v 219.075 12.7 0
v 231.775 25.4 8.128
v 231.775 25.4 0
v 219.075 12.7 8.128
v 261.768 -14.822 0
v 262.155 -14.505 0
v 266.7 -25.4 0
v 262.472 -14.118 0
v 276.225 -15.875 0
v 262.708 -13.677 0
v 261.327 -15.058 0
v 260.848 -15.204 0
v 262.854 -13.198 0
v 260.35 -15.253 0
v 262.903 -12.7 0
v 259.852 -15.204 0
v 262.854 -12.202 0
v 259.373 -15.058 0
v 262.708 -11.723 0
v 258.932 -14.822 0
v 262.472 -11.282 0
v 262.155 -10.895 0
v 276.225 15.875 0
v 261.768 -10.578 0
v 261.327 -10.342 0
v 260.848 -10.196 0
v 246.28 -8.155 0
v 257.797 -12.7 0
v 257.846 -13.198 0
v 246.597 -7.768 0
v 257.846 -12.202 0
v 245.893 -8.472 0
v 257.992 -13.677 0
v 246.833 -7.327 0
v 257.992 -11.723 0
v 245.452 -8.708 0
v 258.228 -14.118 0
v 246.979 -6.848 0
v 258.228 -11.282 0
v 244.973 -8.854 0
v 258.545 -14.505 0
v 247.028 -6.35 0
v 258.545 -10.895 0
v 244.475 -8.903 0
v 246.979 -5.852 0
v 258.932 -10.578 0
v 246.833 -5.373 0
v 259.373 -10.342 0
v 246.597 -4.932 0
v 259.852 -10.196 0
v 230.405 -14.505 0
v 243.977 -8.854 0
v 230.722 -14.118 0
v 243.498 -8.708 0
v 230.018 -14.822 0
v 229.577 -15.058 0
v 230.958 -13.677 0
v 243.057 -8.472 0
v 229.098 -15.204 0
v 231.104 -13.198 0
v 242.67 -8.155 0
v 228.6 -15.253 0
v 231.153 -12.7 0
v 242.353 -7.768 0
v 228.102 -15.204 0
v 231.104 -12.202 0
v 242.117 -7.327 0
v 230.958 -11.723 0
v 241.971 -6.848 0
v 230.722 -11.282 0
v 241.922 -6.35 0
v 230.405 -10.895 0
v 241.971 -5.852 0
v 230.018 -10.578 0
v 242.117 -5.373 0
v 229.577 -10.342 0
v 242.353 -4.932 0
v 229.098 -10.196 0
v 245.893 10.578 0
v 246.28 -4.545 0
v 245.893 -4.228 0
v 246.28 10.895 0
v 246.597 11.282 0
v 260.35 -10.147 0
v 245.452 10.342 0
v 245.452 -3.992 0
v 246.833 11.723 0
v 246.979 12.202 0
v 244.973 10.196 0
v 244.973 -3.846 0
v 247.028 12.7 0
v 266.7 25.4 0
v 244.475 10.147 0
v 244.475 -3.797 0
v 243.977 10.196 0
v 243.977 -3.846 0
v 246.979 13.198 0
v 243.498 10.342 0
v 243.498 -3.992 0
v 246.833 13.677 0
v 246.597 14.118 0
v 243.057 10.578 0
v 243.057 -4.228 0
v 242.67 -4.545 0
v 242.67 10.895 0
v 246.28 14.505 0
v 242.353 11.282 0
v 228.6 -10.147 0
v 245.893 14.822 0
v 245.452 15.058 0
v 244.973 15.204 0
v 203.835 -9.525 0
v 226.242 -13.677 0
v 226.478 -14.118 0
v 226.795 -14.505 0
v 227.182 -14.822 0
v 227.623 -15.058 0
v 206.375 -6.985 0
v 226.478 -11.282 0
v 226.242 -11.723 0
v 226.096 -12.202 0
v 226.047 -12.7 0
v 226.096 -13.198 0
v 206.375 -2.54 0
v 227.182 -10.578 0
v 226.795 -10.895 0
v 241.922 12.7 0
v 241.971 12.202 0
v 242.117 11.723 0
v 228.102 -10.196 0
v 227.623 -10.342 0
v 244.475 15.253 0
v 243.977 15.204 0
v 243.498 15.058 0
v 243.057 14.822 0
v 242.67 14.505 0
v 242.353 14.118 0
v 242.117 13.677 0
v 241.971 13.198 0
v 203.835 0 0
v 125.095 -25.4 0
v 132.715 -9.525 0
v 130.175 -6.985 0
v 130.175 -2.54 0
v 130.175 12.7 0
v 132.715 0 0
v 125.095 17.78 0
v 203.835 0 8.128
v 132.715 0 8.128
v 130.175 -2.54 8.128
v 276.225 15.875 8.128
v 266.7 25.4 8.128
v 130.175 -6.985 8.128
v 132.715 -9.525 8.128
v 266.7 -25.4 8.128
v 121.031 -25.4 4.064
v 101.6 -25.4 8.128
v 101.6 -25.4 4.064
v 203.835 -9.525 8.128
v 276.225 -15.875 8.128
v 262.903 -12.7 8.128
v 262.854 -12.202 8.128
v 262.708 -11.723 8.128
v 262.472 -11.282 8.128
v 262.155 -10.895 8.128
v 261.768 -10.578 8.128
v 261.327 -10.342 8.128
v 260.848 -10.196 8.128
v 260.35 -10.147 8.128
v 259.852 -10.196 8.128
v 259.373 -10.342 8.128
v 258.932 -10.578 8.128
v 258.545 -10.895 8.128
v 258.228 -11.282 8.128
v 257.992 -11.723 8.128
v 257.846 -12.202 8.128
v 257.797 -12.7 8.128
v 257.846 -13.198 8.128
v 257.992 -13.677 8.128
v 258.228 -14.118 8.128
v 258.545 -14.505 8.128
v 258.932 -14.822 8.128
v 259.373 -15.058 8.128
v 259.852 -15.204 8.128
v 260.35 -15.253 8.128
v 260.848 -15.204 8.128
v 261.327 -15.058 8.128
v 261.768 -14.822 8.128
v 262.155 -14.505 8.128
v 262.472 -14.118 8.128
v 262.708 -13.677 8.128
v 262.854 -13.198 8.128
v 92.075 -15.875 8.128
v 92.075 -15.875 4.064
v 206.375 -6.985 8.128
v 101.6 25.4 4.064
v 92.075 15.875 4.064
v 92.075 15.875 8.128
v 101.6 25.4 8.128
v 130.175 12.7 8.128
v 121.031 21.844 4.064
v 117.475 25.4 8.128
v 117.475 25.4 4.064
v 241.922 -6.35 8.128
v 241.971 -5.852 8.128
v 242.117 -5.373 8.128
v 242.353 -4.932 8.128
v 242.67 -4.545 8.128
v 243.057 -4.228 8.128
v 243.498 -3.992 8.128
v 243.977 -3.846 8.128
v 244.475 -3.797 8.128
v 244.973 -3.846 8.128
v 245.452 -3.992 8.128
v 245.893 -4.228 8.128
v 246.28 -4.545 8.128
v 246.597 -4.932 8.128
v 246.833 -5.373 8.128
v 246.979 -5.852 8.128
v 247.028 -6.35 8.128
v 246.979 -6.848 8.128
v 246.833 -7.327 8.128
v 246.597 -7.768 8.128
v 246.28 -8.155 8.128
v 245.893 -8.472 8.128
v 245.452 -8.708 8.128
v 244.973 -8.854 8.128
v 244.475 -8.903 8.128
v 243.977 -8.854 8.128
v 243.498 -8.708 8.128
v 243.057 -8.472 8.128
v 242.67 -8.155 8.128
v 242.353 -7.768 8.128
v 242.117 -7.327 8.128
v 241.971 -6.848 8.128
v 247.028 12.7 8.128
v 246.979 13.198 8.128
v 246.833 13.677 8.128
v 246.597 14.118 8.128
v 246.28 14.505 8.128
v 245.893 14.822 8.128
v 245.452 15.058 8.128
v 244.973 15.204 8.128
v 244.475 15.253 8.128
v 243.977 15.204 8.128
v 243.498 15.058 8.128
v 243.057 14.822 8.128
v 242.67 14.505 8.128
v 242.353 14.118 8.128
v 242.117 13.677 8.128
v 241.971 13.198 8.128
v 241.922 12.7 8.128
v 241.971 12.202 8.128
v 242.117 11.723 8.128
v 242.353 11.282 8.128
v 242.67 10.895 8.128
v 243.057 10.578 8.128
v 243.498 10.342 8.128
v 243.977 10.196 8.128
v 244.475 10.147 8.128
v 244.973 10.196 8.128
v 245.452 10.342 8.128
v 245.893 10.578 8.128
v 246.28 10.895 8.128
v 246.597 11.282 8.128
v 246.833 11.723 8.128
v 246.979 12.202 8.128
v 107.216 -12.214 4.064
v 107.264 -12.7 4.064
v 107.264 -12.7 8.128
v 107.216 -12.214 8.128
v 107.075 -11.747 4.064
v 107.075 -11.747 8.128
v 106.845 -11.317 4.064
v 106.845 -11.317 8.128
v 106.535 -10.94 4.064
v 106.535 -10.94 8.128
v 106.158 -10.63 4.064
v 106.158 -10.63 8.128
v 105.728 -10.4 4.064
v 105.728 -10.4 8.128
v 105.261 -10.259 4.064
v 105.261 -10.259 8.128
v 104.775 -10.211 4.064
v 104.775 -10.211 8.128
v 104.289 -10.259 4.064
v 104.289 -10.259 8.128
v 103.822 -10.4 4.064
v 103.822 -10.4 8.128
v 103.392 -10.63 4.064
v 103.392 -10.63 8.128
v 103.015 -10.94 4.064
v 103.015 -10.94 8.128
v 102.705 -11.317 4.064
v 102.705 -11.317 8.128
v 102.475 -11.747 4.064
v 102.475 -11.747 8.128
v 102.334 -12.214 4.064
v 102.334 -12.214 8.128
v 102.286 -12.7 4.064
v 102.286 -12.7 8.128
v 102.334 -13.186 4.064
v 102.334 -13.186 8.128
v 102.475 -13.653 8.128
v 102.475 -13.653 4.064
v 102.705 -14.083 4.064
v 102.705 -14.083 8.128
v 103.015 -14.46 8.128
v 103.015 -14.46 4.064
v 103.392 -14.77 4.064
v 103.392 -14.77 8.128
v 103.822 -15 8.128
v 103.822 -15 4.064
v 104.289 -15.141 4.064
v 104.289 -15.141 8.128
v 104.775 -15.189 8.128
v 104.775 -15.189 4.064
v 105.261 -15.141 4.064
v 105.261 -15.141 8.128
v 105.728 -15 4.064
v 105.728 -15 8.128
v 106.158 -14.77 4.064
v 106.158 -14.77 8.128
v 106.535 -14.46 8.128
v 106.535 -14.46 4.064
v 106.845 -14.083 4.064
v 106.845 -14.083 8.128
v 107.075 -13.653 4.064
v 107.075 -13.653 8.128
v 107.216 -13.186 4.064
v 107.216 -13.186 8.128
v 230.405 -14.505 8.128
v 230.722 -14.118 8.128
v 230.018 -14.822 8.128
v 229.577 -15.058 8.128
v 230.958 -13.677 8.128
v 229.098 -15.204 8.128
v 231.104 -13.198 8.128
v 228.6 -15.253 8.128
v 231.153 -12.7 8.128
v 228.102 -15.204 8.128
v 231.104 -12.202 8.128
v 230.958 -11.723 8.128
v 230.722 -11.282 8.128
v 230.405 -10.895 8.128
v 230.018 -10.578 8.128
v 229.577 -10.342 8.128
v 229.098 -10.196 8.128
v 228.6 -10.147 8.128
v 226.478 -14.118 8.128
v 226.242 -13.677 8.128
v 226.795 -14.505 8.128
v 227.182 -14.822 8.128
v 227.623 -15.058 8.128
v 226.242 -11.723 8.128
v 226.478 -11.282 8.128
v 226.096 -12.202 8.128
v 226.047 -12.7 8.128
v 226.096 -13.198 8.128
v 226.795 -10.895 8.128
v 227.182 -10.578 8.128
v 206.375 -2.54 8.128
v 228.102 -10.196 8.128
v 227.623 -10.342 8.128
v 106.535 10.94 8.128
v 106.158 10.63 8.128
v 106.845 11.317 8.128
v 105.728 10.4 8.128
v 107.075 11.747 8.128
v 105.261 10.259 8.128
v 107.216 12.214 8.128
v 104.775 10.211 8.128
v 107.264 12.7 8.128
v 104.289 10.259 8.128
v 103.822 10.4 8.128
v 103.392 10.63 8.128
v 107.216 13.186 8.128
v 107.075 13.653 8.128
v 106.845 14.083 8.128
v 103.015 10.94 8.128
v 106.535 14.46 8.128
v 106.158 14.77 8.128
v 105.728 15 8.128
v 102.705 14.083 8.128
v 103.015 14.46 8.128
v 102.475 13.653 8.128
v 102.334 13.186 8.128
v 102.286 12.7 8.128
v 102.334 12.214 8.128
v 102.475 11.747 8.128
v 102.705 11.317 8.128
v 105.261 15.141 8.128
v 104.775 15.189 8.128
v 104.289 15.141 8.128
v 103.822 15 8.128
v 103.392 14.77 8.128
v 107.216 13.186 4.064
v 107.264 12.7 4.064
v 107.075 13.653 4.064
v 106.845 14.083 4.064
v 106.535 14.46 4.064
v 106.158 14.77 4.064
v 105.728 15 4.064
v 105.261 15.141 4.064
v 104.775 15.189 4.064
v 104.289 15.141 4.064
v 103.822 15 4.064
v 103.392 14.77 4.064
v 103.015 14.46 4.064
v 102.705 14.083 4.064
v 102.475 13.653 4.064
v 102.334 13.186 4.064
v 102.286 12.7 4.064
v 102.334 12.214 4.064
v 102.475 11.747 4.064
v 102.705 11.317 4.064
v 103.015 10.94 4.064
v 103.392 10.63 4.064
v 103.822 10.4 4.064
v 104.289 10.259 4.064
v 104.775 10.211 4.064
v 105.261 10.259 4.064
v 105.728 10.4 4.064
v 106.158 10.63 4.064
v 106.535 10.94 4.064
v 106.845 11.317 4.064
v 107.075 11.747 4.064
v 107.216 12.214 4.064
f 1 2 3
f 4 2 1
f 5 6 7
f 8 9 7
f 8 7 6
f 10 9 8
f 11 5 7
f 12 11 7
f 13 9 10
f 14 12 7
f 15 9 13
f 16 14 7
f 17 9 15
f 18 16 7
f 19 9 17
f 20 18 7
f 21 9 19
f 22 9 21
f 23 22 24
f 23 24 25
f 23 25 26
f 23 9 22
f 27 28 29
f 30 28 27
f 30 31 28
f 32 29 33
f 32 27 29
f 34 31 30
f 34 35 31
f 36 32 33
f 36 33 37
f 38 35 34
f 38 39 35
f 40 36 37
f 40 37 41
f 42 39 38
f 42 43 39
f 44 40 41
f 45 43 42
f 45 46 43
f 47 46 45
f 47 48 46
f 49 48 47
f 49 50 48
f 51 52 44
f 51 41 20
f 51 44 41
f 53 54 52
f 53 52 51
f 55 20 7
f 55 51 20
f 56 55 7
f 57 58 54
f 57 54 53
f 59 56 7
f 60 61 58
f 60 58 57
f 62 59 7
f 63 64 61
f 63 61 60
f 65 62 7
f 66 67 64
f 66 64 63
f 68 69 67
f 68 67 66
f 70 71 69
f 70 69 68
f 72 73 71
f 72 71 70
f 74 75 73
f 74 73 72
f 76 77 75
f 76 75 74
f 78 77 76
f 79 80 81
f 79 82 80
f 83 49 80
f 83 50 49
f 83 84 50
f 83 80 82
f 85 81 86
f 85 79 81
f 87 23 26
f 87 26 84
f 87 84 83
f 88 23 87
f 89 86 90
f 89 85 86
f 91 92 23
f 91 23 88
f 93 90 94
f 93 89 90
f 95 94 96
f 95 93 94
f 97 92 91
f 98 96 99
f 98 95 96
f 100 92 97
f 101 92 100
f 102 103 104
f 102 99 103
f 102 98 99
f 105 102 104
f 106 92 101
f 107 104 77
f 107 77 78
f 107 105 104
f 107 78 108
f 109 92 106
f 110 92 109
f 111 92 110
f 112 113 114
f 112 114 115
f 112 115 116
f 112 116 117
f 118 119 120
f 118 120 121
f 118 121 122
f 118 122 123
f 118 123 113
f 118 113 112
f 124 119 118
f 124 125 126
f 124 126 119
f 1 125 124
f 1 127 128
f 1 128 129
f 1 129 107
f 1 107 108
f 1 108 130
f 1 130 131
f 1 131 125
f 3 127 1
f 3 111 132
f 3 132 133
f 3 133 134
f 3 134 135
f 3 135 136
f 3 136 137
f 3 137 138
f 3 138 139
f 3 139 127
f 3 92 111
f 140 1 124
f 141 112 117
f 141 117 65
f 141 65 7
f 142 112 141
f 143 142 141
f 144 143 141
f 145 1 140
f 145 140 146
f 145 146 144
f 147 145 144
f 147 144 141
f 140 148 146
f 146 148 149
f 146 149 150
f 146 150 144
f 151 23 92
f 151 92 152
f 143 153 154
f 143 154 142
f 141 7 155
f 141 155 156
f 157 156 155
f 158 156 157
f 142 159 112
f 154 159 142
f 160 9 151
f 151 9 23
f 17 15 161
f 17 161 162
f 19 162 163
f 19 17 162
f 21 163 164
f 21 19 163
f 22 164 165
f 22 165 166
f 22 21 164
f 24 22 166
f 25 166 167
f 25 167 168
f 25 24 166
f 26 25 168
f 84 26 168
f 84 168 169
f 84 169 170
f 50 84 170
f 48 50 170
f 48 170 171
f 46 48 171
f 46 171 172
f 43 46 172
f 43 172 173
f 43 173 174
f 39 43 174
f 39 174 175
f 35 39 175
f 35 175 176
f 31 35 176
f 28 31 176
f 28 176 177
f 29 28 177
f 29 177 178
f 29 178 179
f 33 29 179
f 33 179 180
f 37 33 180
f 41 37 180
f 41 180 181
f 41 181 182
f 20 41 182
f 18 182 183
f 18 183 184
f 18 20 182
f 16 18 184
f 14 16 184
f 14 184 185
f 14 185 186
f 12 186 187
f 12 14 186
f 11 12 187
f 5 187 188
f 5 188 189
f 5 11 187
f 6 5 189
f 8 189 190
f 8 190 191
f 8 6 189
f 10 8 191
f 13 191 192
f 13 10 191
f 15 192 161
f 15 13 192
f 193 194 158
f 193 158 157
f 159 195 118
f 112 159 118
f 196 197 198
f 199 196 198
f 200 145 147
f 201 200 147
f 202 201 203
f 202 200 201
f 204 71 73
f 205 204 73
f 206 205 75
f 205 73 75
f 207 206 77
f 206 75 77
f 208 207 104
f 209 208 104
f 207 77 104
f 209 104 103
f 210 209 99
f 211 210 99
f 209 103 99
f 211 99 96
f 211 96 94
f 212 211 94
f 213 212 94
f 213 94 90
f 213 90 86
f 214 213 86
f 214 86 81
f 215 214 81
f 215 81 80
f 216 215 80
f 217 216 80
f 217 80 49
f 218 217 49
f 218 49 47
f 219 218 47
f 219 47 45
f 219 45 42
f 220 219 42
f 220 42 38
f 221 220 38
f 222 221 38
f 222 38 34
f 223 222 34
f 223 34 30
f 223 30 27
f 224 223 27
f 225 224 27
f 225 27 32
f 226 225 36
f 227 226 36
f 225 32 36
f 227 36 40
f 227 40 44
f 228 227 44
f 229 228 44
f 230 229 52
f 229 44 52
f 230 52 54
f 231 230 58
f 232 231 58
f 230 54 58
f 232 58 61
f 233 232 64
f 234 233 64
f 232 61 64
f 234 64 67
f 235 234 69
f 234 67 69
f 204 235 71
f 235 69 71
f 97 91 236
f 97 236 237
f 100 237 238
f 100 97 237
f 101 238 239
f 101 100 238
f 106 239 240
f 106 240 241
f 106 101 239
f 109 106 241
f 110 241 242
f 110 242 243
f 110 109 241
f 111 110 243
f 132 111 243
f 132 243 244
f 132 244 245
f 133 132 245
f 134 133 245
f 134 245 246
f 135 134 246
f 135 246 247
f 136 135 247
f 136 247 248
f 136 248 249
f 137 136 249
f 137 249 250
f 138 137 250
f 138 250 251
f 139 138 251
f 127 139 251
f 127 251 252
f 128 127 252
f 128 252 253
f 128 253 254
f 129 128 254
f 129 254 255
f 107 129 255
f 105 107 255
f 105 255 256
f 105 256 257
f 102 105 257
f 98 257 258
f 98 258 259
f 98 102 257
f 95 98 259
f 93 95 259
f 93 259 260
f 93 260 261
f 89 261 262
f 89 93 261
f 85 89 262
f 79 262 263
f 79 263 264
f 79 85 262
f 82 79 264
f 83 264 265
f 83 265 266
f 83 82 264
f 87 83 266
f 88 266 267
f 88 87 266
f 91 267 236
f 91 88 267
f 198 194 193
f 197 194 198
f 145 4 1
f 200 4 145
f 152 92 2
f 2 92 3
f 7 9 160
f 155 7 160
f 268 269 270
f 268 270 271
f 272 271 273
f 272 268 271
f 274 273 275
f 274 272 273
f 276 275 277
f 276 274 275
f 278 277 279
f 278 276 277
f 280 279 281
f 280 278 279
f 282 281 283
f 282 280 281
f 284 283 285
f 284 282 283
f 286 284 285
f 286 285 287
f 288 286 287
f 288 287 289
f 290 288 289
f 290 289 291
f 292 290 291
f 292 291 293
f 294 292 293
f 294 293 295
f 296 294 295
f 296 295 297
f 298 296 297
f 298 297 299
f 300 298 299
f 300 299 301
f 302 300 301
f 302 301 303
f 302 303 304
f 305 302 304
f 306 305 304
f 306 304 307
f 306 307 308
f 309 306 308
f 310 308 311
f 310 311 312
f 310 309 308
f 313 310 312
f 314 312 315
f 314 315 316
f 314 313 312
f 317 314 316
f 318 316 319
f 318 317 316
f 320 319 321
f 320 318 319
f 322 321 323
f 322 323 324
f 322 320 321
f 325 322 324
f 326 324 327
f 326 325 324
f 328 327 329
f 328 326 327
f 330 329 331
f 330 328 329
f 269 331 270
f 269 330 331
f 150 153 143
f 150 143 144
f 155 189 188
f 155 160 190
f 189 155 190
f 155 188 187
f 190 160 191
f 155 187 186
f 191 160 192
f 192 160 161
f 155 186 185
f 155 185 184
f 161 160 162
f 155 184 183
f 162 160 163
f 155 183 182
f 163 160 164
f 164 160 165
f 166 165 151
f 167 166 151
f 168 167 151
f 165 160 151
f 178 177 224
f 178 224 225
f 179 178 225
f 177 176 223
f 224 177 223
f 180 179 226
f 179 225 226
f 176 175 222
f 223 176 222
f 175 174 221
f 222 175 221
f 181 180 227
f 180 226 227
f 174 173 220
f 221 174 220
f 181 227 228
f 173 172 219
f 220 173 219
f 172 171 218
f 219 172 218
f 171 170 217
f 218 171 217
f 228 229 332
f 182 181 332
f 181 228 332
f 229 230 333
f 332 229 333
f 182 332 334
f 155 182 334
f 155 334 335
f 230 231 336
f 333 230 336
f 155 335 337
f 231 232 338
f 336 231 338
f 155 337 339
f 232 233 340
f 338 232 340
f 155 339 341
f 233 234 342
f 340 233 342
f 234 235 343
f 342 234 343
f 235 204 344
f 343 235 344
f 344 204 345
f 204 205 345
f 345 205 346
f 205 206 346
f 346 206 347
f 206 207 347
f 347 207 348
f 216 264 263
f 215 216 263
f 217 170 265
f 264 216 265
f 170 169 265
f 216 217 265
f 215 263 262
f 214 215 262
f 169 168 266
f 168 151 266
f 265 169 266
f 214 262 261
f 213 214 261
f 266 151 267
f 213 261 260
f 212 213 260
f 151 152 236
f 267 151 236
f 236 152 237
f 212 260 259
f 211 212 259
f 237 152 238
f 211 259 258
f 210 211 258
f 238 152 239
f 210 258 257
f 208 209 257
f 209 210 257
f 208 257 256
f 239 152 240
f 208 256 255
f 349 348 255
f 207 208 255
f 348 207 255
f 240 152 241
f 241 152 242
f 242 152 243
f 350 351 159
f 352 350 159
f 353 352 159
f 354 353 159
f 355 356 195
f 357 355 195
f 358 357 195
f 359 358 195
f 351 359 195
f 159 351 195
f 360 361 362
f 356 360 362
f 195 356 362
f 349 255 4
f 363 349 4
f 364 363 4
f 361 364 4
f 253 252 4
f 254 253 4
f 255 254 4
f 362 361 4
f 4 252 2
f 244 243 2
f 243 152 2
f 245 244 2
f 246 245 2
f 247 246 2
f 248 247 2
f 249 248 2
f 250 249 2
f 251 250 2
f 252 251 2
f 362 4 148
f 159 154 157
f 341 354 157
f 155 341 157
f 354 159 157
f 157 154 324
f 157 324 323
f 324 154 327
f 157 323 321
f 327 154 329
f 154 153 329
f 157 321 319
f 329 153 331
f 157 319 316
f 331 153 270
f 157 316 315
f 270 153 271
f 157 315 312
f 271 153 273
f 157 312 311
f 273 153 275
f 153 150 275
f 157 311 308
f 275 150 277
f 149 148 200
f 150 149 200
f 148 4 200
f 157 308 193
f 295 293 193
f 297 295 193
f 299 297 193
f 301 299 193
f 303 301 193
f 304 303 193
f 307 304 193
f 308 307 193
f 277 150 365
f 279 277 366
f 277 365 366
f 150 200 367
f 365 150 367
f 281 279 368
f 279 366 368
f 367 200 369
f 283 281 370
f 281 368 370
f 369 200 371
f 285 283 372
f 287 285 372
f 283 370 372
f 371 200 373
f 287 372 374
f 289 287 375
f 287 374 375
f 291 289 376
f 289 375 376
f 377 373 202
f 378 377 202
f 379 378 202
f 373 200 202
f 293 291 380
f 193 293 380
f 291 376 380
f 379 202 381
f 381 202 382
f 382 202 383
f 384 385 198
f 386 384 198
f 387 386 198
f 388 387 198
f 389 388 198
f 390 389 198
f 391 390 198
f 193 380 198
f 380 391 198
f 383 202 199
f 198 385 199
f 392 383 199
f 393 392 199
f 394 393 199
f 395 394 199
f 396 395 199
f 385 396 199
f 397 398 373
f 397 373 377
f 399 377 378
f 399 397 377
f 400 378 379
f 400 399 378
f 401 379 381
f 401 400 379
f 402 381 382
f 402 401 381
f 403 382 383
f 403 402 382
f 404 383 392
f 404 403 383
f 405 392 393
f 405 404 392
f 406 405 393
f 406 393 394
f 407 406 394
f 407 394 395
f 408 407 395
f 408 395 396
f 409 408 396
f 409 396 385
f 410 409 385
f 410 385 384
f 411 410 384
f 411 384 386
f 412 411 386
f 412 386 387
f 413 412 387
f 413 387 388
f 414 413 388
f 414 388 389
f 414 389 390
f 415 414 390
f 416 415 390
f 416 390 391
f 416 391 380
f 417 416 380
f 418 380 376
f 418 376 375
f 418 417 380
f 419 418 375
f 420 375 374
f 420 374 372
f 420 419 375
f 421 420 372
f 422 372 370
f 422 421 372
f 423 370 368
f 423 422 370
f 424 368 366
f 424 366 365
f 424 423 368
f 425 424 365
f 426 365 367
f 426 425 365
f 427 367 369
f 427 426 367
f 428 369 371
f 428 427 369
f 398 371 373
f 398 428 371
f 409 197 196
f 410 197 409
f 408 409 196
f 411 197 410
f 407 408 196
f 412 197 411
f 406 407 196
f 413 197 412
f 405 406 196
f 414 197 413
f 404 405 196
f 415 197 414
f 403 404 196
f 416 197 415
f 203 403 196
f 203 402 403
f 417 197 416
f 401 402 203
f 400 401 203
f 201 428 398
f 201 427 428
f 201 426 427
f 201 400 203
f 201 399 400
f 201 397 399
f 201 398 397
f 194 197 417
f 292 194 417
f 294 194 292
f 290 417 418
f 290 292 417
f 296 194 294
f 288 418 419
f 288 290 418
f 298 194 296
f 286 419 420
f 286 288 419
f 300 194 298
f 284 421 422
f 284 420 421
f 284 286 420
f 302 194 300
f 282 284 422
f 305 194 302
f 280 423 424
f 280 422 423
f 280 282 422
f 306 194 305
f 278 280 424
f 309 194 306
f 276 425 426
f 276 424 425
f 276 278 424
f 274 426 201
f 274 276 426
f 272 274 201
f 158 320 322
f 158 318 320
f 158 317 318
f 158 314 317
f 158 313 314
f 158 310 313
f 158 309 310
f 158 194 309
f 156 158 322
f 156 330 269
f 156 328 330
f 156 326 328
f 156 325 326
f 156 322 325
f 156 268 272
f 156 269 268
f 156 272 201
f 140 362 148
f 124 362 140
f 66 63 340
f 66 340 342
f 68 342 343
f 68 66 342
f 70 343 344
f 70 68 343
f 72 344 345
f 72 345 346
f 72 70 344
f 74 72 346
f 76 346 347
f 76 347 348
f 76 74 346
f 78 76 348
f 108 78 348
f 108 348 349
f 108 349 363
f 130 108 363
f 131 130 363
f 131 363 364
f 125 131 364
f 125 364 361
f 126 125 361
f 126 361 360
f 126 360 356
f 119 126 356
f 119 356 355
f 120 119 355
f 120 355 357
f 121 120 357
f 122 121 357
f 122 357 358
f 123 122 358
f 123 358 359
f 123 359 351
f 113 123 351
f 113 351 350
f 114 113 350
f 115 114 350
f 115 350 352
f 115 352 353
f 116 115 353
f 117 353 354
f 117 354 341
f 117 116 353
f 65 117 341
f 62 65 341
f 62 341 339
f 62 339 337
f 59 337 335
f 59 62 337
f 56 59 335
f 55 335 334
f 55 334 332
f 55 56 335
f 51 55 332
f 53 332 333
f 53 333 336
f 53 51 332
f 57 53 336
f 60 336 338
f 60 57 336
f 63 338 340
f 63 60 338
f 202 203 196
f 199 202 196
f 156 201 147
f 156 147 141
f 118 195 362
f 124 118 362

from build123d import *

# Parameters (mm, degrees)
F0_W      = 184.15
F0_H      = 50.8
F1_DEPTH  = 8.128
F3_D      = 5.1054
F6_D      = 4.9784
F7_W      = 76.2
F7_H      = 9.525
F8_DEPTH  = 8.129
F9_SIZE   = 9.525
F10_SIZE  = 2.54
F15_DEPTH = 25.4
F17_D     = 5.1054
F18_R     = 2.4892
F19_DEPTH = 4.064
F20_SIZE  = 4.06399


# Not quite as in the source:
# - a fillet or chamfer is up to 0.001 mm smaller than in the source, because OpenCascade refuses the exact size
# - a feature names something its author has since deleted; it is built from what else it names


with BuildPart() as f1:
    # F0 (on Top) → F1 (new body)
    with BuildSketch(Plane.XY):
        Rectangle(F0_W, F0_H)
    extrude(amount=F1_DEPTH)

    # F3 (through all)
    with Locations(Plane.XY.offset(8.128)):
        with Locations((-60.325, 12.7), (-76.2, -12.7), (-44.45, -12.7)):
            Hole(F3_D / 2)

    # F6 (through all)
    with Locations(Plane.XY.offset(8.128)):
        with Locations((79.375, 12.7), (79.375, -12.7)):
            Hole(F6_D / 2)

    # F7 (on face) → F8 (cut, through all)
    with BuildSketch(Plane.XY.offset(8.128)):
        Polygon((66.675, 25.4), (-47.625, 25.4), (-34.925, 12.7), (53.975, 12.7), align=None)
        with Locations((15.875, -4.7625)):
            Rectangle(F7_W, F7_H)
    extrude(amount=-F8_DEPTH, mode=Mode.SUBTRACT)

    # F9
    f9_edges = [f1.edges().sort_by_distance(p)[0] for p in [
        (-92.075, -25.4, 4.064),
        (-92.075, 25.4, 4.064),
        (92.075, -25.4, 4.064),
        (92.075, 25.4, 4.064),
    ]]
    chamfer(f9_edges, length=F9_SIZE)

    # F10
    f10_edges = [f1.edges().sort_by_distance(p)[0] for p in [
        (-22.225, 0, 4.064),
        (-22.225, -9.525, 4.064),
        (53.975, 0, 4.064),
        (53.975, -9.525, 4.064),
    ]]
    chamfer(f10_edges, length=F10_SIZE)


with BuildPart() as f13_1:
    # F13: instance of F1
    add(f1.part.mirror(Plane(origin=(92.075, 0, 4.064), x_dir=(0, 1, 0), z_dir=(1, 0, 0))))

    # F17 (through all)
    with Locations(Plane.XY.offset(8.128)):
        with Locations((244.475, -6.35)):
            Hole(F17_D / 2)

    # F18 (on face) → F19 (cut)
    with BuildSketch(Plane(origin=(0, 0, 0), x_dir=(1, 0, 0), z_dir=(0, 0, -1))):
        Polygon((125.095, 25.4), (117.475, 25.4), (101.6, 25.4), (92.075, 15.875), (92.075, -15.875), (101.6, -25.4), (117.475, -25.4), (125.095, -17.78), align=None)
        with Locations((104.775, -12.7)):
            Circle(F18_R, mode=Mode.SUBTRACT)
        with Locations((104.775, 12.7)):
            Circle(F18_R, mode=Mode.SUBTRACT)
    extrude(amount=-F19_DEPTH, mode=Mode.SUBTRACT)

    # F20 (size 4.064 in the source; OpenCascade refuses exactly that, so slightly less here)
    f20_edges = [f13_1.edges().sort_by_distance(p)[0] for p in [
        (125.095, -3.81, 4.064),
    ]]
    chamfer(f20_edges, length=F20_SIZE)


with BuildPart() as f1_1:
    add(f1.part)

    # F14 (on face) → F15 (cut)
    with BuildSketch(Plane.XY.offset(8.128)):
        Polygon((-100.5587801337, -25.4), (92.075, -25.4), (92.075, -15.875), (92.075, 15.875), (92.075, 34.0131297708), (-100.5587801337, 34.0131297708), align=None)
    extrude(amount=-F15_DEPTH, mode=Mode.SUBTRACT)


solid = f13_1.part
